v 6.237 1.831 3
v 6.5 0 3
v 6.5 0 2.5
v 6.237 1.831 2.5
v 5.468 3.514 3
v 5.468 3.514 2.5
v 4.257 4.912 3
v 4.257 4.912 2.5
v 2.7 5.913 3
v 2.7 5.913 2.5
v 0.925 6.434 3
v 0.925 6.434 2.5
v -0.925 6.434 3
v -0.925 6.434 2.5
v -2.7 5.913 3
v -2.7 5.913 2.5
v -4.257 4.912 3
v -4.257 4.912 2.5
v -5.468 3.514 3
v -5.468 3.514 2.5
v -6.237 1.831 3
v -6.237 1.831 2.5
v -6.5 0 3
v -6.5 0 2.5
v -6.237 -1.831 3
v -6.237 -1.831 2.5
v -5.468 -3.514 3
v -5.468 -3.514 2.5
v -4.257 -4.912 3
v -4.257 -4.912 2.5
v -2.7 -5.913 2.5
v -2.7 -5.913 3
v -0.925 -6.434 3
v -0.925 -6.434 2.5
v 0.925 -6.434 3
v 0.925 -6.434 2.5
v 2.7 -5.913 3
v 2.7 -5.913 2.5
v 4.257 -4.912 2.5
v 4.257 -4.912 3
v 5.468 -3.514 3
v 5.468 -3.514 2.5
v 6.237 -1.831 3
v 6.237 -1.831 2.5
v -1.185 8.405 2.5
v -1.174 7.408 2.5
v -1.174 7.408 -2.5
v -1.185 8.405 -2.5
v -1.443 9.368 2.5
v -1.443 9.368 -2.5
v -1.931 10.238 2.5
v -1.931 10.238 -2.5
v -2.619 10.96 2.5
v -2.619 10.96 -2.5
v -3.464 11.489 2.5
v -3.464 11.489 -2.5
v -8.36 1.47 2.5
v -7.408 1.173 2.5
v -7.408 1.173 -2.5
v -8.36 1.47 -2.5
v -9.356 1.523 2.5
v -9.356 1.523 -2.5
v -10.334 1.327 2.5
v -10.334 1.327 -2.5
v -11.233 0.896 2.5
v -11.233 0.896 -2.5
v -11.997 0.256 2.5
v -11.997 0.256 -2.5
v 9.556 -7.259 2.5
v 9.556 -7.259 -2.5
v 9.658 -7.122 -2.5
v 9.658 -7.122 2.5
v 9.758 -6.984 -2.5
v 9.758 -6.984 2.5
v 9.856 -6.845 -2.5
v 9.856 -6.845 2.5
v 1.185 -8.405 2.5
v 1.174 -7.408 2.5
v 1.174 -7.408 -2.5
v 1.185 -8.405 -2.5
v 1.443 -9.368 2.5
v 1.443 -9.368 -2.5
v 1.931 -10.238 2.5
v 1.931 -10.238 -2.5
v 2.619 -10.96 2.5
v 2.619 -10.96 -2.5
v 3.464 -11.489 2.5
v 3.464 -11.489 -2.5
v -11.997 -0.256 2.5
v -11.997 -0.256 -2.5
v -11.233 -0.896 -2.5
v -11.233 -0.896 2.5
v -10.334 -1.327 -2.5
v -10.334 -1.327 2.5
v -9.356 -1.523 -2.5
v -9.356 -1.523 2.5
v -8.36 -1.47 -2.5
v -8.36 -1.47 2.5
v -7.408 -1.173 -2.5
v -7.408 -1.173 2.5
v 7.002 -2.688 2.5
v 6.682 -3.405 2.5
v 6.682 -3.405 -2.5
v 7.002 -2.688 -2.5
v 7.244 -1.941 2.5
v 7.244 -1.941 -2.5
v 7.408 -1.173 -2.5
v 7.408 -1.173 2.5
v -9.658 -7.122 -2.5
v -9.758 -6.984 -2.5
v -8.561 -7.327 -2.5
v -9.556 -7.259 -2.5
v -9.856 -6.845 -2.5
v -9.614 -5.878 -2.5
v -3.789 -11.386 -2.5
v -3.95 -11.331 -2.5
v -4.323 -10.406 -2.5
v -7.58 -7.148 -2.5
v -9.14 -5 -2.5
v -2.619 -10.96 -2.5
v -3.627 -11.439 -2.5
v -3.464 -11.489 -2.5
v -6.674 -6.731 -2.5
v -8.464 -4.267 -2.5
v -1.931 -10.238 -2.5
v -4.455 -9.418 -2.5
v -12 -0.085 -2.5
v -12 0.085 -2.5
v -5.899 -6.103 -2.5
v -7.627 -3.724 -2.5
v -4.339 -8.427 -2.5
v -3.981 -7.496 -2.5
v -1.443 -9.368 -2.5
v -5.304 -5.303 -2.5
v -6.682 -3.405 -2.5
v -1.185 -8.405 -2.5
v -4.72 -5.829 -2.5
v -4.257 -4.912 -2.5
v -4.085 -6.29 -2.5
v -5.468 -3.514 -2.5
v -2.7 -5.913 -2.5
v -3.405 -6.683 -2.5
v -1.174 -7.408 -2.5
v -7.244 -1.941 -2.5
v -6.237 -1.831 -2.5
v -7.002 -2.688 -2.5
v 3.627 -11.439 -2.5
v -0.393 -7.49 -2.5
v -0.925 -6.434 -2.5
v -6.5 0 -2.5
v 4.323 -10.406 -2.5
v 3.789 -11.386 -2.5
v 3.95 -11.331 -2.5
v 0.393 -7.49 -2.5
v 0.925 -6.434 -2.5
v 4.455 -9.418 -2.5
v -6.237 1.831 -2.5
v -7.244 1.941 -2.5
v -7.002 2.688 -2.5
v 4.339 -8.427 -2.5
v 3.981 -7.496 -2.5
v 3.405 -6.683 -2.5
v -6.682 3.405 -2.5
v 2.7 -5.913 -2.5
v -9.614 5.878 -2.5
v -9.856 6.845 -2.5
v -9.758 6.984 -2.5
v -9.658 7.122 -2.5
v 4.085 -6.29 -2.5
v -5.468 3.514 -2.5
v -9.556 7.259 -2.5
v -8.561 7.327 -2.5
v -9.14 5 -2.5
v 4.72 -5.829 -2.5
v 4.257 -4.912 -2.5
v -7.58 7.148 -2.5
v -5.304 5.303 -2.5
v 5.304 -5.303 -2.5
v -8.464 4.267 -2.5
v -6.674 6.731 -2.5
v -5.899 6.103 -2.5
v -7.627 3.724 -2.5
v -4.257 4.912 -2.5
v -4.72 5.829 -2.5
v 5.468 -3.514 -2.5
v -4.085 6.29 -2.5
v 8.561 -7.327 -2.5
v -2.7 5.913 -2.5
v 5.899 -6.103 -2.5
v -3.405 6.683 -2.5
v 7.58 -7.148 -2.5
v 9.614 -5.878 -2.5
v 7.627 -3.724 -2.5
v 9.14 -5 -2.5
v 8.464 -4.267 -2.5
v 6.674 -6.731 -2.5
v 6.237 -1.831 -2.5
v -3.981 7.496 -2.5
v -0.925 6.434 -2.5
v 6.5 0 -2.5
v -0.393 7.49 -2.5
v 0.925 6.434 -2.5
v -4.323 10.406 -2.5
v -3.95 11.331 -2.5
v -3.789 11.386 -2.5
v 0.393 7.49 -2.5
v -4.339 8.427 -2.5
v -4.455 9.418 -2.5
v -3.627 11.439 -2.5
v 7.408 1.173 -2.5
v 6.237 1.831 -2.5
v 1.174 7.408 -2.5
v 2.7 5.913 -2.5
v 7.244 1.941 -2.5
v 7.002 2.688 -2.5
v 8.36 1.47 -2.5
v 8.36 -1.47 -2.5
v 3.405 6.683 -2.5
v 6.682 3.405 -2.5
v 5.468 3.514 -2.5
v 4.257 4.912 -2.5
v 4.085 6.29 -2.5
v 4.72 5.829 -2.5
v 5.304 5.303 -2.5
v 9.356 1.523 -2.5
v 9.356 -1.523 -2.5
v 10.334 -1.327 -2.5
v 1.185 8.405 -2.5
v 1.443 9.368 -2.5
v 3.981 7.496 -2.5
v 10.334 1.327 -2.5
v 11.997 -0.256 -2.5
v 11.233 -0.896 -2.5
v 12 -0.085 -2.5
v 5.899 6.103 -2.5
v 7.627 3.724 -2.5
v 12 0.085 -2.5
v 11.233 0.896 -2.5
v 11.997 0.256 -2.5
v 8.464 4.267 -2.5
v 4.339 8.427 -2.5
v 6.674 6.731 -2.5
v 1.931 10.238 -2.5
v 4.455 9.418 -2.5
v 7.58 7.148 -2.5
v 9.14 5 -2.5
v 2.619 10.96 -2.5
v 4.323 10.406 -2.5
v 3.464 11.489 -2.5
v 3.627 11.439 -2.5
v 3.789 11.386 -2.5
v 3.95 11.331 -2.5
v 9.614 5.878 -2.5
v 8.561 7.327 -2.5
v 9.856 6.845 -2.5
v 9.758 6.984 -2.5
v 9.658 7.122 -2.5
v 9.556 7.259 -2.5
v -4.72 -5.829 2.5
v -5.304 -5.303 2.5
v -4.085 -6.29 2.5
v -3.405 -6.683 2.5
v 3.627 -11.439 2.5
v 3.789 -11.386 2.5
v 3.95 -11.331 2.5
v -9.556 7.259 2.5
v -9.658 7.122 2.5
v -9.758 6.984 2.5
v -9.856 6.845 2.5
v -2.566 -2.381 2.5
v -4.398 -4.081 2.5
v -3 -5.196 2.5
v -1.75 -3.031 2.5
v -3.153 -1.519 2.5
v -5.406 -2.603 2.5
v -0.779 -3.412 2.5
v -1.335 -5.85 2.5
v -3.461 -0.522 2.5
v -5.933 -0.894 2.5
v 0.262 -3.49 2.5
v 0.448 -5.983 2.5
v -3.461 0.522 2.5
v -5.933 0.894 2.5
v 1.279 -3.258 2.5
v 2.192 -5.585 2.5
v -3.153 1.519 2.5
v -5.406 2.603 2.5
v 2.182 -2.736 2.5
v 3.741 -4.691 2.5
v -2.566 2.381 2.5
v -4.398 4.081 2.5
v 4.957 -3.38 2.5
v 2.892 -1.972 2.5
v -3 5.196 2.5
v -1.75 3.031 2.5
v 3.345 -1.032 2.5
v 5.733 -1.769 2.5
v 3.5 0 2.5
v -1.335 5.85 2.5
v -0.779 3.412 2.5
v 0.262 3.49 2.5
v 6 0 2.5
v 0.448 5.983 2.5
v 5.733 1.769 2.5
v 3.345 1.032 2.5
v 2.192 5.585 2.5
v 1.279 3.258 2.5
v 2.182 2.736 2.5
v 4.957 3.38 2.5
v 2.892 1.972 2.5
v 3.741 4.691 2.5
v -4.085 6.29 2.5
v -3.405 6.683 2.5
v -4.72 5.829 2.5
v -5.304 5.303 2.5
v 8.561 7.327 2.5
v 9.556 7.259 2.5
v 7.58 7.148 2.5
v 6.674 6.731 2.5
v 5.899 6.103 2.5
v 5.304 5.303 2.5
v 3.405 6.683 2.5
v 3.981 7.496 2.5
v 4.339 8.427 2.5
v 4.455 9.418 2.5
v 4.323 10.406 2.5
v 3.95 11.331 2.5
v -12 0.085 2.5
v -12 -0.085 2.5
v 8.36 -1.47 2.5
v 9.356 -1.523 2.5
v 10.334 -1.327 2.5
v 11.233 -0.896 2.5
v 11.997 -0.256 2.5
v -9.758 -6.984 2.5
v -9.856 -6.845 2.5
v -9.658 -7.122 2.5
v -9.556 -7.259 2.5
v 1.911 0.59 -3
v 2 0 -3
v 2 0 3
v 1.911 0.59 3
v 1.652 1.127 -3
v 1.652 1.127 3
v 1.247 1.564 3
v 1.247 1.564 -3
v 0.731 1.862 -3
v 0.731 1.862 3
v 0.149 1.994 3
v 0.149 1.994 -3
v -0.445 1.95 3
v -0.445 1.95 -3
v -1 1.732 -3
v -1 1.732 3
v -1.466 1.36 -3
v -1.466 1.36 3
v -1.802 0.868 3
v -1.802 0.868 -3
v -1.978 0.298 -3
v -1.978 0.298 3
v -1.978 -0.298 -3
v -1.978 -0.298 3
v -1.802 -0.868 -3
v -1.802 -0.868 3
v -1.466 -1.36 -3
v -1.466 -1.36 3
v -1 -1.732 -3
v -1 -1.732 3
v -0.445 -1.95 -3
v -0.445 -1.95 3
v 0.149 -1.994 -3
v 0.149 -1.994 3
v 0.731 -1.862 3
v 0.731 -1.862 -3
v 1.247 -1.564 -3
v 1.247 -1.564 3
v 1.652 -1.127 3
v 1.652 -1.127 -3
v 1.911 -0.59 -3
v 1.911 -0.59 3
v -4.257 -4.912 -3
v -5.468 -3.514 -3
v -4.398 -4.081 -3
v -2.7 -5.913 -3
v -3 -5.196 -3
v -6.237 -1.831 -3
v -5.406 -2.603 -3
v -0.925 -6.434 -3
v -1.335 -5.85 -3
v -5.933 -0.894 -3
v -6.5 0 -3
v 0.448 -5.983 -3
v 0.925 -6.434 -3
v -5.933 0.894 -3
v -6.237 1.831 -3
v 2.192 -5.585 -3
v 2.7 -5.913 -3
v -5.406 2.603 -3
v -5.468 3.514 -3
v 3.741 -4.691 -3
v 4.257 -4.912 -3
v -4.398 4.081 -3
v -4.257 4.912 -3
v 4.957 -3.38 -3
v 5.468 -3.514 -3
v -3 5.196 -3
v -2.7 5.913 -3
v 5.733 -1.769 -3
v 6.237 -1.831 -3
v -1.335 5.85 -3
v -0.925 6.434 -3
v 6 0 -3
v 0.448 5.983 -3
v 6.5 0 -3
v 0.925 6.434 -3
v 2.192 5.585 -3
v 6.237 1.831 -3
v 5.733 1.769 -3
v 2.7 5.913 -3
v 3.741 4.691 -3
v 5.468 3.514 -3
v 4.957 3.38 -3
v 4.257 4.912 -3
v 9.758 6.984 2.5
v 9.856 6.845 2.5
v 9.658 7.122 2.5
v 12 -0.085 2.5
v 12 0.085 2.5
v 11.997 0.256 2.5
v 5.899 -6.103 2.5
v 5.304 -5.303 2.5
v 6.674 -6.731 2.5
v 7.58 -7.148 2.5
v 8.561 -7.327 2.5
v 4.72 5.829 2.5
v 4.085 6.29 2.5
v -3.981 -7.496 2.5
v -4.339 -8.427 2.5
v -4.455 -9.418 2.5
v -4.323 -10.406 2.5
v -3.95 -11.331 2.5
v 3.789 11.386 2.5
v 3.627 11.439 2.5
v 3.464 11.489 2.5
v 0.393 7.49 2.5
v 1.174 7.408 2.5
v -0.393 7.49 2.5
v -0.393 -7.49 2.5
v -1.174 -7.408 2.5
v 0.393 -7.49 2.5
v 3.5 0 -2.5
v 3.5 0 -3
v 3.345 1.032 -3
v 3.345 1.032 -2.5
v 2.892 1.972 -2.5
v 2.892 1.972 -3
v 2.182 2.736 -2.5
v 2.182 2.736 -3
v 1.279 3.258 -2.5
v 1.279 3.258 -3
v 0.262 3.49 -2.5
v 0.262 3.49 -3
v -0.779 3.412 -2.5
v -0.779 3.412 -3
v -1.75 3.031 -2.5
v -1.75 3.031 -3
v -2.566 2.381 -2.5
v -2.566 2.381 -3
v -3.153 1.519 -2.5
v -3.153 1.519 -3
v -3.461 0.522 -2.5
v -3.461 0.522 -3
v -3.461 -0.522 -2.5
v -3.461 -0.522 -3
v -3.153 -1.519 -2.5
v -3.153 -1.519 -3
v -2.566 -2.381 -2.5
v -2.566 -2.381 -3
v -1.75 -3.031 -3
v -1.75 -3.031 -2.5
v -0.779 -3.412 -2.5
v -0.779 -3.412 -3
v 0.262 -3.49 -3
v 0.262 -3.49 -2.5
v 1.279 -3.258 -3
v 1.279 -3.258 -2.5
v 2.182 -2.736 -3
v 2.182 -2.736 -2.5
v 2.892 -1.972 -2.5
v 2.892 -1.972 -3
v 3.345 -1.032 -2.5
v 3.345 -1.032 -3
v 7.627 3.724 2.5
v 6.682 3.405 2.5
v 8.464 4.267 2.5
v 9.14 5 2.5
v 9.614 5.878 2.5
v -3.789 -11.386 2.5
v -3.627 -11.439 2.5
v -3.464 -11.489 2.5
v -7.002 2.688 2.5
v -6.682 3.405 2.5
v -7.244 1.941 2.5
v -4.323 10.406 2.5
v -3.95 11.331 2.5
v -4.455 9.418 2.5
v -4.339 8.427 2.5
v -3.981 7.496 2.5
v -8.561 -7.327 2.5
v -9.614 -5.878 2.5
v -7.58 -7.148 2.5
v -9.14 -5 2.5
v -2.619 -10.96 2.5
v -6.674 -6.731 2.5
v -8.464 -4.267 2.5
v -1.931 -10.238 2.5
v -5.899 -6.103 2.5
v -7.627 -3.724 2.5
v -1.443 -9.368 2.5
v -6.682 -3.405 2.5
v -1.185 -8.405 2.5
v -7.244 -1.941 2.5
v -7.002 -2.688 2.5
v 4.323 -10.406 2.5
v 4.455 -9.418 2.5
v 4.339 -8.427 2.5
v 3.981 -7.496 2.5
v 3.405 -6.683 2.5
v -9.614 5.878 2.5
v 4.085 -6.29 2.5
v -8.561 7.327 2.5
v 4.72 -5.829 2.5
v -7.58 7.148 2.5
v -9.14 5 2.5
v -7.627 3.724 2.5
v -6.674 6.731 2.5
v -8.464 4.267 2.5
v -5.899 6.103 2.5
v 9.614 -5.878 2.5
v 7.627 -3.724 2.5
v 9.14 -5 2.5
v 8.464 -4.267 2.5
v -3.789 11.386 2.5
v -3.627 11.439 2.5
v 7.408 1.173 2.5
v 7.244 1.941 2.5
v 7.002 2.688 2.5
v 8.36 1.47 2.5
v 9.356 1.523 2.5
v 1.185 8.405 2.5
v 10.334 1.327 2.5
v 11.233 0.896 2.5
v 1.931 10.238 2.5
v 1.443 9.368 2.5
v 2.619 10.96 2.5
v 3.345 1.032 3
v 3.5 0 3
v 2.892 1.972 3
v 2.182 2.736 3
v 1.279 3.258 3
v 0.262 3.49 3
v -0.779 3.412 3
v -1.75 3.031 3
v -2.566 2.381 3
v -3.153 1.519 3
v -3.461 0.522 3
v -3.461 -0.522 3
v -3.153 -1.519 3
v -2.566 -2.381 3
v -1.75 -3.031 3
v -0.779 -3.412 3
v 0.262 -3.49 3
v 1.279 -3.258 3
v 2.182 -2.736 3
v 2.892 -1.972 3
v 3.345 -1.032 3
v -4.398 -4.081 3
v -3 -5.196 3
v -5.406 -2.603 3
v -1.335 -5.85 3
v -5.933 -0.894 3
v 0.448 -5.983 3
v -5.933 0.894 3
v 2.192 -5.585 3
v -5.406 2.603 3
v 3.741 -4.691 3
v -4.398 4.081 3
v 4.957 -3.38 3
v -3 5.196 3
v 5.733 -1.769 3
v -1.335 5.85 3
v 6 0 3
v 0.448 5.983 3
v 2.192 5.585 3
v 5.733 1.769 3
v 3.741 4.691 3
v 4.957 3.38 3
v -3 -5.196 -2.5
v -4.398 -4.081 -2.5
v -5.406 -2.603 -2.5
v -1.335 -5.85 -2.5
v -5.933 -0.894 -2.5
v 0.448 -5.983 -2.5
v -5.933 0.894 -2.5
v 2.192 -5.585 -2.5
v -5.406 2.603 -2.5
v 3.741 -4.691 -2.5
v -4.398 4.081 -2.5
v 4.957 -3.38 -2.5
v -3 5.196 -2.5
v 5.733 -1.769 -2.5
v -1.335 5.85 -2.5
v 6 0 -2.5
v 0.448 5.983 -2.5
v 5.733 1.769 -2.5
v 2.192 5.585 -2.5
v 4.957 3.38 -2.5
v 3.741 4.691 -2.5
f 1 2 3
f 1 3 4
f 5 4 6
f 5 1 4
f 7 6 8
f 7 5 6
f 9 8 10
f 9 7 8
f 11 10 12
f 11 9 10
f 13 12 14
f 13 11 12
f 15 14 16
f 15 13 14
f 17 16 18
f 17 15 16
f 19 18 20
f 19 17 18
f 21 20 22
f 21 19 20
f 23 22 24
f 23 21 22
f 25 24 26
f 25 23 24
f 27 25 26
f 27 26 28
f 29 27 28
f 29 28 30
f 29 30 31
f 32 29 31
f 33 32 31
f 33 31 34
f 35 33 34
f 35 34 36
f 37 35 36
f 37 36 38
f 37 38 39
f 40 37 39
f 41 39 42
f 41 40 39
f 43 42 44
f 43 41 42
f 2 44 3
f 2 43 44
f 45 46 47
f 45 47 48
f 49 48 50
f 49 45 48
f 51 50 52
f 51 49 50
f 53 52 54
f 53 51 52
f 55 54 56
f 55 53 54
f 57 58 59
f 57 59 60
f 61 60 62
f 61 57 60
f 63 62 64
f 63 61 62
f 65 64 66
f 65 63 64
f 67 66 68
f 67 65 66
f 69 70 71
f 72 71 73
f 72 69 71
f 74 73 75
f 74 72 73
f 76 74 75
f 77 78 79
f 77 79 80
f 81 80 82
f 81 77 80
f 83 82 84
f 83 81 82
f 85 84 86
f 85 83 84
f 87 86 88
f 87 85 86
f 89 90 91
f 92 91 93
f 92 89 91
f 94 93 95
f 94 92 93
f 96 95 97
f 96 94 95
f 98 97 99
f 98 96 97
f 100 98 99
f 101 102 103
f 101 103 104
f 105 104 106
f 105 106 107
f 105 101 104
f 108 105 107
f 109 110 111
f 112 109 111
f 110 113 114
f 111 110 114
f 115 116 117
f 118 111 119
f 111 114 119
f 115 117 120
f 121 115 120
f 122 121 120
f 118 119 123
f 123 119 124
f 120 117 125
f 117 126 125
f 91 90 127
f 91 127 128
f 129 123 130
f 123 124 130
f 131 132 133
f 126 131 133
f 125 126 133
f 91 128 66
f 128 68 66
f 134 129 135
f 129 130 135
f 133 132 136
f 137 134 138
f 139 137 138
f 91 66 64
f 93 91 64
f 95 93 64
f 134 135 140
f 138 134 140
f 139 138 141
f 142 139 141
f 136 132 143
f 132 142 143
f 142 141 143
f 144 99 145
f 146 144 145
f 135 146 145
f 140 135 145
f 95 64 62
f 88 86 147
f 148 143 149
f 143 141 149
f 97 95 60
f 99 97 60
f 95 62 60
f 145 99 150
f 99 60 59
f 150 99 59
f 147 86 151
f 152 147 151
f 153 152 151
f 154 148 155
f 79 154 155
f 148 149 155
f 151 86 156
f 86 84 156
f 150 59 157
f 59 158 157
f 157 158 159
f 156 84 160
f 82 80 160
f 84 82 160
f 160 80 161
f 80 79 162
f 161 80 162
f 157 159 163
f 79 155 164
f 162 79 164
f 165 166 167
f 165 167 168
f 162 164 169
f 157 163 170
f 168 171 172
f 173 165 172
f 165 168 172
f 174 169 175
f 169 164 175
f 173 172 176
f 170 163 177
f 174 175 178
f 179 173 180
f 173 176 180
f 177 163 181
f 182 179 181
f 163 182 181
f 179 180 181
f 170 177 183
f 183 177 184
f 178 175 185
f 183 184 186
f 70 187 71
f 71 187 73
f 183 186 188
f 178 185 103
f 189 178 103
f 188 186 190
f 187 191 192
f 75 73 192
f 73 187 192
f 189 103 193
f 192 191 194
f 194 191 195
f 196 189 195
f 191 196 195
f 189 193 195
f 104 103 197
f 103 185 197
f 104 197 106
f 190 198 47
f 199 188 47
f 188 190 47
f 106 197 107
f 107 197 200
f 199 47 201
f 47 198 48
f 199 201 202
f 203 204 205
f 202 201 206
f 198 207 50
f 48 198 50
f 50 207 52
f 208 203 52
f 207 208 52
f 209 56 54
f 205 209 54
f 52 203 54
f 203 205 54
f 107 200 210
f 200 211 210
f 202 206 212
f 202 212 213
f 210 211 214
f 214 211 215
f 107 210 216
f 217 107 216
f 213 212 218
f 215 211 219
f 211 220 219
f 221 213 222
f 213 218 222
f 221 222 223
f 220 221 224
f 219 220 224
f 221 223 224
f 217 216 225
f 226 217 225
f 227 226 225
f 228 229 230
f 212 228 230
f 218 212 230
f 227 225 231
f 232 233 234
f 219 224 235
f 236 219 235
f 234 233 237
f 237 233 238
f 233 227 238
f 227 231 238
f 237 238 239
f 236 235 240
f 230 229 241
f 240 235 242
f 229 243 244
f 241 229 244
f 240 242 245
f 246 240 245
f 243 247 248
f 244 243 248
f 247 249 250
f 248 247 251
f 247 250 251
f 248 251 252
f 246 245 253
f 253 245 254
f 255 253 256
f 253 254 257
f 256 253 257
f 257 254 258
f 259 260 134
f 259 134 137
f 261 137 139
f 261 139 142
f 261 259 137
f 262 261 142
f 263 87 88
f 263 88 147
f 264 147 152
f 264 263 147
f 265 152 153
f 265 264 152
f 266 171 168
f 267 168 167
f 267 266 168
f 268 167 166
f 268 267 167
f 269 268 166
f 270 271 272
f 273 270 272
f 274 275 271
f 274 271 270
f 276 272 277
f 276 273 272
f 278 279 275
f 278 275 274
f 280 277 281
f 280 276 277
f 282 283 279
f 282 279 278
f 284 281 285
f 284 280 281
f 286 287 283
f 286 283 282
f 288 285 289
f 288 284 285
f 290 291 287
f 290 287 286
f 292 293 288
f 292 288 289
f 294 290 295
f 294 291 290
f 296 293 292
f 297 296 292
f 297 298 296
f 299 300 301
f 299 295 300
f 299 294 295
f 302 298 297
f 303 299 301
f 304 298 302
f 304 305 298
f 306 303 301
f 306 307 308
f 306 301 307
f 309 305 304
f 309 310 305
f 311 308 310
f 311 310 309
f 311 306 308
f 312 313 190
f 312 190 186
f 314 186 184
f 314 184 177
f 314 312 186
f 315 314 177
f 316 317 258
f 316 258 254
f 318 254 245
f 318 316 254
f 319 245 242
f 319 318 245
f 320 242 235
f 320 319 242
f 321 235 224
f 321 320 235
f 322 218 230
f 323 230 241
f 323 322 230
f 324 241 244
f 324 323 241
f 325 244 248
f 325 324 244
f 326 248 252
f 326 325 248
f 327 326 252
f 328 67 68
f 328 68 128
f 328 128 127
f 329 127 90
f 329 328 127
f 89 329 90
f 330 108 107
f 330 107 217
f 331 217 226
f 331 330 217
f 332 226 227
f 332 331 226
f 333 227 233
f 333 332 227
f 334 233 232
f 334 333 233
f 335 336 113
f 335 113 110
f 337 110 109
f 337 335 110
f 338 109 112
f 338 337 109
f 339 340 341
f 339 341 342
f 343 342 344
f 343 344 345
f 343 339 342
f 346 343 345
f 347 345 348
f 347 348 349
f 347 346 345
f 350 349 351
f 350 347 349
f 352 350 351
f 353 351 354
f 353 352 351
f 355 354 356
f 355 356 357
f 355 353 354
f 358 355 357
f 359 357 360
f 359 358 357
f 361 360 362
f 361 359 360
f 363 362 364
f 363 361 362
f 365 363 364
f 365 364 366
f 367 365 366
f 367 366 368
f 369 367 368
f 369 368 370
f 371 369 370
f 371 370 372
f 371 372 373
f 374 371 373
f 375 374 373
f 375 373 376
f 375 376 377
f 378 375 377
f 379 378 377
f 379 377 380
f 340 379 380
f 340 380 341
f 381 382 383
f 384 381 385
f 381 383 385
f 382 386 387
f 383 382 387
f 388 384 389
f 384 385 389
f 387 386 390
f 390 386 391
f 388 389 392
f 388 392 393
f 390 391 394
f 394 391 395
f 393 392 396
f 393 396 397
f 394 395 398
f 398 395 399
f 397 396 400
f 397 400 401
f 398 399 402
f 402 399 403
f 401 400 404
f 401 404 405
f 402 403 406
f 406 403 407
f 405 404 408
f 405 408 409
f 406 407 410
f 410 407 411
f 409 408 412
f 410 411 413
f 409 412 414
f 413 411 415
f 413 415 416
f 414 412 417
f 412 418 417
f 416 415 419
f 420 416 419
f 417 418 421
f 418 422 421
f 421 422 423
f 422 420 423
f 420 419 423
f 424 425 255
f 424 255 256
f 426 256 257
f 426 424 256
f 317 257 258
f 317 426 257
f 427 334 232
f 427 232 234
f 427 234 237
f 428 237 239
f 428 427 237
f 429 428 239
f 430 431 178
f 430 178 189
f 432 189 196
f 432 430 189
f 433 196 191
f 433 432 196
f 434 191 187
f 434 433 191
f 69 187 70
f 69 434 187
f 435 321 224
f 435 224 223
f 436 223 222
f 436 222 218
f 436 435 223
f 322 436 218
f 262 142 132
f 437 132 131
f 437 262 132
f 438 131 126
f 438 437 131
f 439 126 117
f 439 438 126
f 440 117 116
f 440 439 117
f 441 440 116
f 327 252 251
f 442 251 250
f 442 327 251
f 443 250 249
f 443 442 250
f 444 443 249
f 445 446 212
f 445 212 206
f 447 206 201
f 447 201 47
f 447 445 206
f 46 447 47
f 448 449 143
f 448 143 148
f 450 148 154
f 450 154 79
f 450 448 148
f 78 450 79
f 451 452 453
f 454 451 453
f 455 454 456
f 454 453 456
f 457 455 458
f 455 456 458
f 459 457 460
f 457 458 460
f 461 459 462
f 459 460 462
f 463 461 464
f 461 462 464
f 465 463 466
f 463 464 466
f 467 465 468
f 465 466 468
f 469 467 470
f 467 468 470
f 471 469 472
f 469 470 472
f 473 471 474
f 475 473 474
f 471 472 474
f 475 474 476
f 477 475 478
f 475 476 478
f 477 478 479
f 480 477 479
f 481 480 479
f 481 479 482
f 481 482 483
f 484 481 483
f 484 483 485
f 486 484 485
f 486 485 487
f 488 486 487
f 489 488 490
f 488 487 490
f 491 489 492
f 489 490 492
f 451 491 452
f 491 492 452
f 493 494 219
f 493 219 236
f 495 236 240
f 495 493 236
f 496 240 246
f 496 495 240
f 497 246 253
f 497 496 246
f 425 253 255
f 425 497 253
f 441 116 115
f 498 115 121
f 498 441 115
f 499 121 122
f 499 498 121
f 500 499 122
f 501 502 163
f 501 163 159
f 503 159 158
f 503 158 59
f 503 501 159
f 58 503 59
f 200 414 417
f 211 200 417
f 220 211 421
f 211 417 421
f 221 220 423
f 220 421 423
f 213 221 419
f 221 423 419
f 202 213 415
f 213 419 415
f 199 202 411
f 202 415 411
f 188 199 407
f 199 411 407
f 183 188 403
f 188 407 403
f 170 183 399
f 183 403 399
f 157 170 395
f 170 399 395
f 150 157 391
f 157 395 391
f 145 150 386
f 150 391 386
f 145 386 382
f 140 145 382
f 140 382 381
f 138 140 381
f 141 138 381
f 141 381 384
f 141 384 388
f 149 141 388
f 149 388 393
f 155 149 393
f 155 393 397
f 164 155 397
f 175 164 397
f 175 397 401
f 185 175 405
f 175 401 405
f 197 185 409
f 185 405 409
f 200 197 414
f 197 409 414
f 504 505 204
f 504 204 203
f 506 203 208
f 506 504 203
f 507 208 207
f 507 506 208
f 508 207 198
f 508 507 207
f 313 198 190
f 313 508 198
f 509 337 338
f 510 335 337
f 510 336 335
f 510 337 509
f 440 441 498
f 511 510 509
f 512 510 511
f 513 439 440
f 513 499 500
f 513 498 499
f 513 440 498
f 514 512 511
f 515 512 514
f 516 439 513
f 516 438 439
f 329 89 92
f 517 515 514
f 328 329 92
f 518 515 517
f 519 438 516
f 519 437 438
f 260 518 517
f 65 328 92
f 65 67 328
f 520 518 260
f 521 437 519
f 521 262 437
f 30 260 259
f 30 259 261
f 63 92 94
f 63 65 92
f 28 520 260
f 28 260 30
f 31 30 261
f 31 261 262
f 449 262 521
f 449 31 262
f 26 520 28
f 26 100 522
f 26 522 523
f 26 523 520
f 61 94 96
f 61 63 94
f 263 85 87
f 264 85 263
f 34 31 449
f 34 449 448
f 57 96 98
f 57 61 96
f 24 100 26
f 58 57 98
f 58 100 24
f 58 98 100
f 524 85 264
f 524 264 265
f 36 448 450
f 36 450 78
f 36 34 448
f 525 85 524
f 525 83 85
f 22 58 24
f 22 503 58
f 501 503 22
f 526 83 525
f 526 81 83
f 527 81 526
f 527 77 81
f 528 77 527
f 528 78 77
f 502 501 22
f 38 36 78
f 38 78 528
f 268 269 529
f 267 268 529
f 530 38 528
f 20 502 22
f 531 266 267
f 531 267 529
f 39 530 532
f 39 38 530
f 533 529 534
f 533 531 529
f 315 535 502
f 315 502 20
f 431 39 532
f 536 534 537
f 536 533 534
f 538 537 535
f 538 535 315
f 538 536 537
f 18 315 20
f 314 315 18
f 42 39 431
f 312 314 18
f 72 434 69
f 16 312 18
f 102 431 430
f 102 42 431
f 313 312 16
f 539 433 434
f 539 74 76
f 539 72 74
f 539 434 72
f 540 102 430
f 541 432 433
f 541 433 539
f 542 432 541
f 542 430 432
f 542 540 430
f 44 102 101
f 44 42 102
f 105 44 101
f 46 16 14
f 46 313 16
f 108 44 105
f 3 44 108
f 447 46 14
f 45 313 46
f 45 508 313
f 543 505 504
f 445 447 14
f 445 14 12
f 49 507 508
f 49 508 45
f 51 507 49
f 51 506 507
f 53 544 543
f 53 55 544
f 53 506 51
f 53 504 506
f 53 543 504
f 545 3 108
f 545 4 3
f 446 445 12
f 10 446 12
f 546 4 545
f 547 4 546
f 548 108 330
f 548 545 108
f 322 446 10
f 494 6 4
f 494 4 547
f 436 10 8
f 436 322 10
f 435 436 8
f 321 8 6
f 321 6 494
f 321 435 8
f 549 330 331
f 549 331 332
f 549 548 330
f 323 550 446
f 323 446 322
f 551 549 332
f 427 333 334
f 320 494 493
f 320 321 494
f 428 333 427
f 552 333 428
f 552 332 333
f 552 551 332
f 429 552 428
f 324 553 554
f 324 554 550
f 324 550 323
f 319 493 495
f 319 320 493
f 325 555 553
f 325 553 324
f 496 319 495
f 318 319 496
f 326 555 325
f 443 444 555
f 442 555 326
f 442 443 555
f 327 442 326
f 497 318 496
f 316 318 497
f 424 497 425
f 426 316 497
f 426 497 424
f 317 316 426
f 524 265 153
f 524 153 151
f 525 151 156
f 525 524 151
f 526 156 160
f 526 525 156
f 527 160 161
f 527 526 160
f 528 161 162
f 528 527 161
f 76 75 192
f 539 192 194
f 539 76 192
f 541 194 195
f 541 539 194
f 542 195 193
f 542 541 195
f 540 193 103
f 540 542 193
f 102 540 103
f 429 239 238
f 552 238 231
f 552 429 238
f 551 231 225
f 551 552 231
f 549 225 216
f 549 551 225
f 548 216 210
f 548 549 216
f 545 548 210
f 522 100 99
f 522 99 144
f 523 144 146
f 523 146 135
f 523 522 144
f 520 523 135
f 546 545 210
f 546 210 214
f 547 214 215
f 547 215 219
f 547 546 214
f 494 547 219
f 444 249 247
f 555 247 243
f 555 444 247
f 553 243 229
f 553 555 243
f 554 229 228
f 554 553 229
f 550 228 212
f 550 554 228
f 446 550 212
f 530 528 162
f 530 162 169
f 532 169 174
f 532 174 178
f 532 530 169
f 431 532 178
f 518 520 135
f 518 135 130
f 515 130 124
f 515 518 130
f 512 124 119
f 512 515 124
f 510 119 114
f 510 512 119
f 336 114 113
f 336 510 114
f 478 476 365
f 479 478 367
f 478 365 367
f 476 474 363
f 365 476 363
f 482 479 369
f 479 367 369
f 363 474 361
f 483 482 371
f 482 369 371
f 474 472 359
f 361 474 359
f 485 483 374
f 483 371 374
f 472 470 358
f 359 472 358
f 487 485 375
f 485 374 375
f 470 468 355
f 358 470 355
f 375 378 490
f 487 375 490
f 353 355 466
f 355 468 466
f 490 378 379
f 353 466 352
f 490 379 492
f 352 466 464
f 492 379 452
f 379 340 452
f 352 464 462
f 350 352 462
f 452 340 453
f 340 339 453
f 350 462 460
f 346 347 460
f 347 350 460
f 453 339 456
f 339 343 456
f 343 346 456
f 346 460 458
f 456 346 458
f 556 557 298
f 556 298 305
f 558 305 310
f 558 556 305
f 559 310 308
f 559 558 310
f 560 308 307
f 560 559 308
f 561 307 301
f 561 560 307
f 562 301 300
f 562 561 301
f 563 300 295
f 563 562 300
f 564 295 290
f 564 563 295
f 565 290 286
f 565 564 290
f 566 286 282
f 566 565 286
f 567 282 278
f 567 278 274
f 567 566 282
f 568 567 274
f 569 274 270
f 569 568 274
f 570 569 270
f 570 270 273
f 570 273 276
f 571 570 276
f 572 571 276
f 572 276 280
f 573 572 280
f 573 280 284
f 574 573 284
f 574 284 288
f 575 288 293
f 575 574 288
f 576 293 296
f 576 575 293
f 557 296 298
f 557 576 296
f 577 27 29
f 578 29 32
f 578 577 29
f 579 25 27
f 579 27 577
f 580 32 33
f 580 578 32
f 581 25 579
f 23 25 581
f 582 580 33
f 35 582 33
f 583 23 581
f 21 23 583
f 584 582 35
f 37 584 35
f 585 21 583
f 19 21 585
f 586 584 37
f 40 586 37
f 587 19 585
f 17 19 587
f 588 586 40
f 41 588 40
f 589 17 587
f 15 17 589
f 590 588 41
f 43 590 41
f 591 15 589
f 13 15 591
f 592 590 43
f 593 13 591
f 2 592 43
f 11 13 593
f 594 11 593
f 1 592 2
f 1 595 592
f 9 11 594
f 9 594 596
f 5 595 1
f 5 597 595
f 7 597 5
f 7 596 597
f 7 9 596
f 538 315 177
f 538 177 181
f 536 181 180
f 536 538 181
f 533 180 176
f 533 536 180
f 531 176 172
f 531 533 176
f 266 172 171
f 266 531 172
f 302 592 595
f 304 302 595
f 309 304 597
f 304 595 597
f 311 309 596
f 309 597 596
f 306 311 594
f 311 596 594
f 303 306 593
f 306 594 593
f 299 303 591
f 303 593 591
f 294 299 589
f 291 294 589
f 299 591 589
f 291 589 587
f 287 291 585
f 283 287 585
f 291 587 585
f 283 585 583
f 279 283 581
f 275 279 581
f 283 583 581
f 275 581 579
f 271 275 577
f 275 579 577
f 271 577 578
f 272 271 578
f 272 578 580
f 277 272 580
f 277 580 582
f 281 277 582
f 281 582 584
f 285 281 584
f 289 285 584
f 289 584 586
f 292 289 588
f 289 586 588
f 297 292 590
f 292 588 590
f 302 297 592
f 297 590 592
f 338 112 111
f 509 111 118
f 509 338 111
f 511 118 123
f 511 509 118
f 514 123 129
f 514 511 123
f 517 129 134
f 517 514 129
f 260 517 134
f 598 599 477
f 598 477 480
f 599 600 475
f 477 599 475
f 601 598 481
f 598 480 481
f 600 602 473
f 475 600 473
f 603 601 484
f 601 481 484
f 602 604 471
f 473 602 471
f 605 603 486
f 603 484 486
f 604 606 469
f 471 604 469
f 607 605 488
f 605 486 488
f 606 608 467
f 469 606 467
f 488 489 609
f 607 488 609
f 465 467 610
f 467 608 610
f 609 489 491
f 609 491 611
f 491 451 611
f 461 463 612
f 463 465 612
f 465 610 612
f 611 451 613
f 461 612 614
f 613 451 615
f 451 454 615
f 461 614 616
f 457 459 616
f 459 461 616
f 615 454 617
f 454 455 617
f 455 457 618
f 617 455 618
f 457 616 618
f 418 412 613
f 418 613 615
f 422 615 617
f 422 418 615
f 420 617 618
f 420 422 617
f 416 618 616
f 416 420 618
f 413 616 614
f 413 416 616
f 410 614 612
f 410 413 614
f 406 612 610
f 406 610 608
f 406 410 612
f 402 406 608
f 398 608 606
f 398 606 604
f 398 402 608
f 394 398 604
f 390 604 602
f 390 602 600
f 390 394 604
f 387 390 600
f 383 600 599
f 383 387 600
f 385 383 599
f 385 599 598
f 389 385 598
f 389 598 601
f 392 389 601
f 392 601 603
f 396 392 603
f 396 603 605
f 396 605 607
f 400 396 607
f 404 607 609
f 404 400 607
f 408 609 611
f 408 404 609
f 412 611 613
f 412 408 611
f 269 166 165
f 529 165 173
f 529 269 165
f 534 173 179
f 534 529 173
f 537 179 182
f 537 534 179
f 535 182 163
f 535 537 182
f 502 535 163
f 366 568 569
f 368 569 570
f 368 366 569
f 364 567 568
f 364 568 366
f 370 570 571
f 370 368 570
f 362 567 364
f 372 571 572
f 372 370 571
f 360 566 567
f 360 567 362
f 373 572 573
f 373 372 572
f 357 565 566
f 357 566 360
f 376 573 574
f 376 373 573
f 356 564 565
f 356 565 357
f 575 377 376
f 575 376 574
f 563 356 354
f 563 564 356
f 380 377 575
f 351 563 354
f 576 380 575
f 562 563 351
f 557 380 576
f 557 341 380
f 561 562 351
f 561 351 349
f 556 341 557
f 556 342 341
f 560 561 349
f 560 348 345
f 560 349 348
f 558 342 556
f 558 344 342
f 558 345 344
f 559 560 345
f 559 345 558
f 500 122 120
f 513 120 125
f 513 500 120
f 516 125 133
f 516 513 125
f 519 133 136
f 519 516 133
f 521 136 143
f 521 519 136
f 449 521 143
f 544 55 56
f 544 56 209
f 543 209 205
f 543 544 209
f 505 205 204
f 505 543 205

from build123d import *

# Parameters (mm, degrees)
SKETCH1_R           = 12
BOSS_EXTRUDE1_DEPTH = 2.5
CUT_EXTRUDE2_DEPTH  = 18.691806013
CIRPATTERN2_COUNT   = 10
SKETCH3_R           = 2
CUT_EXTRUDE3_DEPTH  = 18.349304428
BOSS_EXTRUDE2_START = 0.5
SKETCH4_R           = 6.5
SKETCH4_R_2         = 6
SKETCH4_R_3         = 3.5
SKETCH4_R_4         = 2
BOSS_EXTRUDE2_DEPTH = 0.5


with BuildPart() as part:
    # Sketch1 → Boss-Extrude1 (new, symmetric)
    with BuildSketch(Plane.XY):
        Circle(SKETCH1_R)
    extrude(amount=BOSS_EXTRUDE1_DEPTH, both=True)

    # Sketch2 → Cut-Extrude2 (cut, through all)
    with BuildSketch(Plane.XY.offset(2.5)):
        with BuildLine():
            ThreePointArc((1.173656282, 7.407599539), (0, 7.5), (-1.173656282, 7.407599539))
            ThreePointArc((-1.173656282, 7.407599539), (-1.669021324, 9.83476625), (-3.49865822, 11.504782295))
            ThreePointArc((-3.49865822, 11.504782295), (0, 12.025), (3.49865822, 11.504782295))
            ThreePointArc((3.49865822, 11.504782295), (1.669021324, 9.83476625), (1.173656282, 7.407599539))
        make_face()
    cut_extrude2 = extrude(amount=-CUT_EXTRUDE2_DEPTH, mode=Mode.SUBTRACT)

    # CirPattern2: Cut-Extrude2 ×10 about axis
    cirpattern2_axis = Axis((0, 0, 0), (0, 0, 1))
    for i in range(1, CIRPATTERN2_COUNT):
        add(cut_extrude2.rotate(cirpattern2_axis, i * 360 / CIRPATTERN2_COUNT), mode=Mode.SUBTRACT)

    # Sketch3 → Cut-Extrude3 (cut, through all)
    with BuildSketch(Plane.XY.offset(2.5)):
        Circle(SKETCH3_R)
    extrude(amount=-CUT_EXTRUDE3_DEPTH, mode=Mode.SUBTRACT)

    # Sketch4 → Boss-Extrude2 (add)
    # profile 1 of 2: a face of its own
    with BuildSketch(Plane.XY.offset(2.5).offset(BOSS_EXTRUDE2_START)):
        Circle(SKETCH4_R)
        Circle(SKETCH4_R_2, mode=Mode.SUBTRACT)
    # profile 2 of 2: a face of its own
    with BuildSketch(Plane.XY.offset(2.5).offset(BOSS_EXTRUDE2_START)):
        Circle(SKETCH4_R_3)
        Circle(SKETCH4_R_4, mode=Mode.SUBTRACT)
    boss_extrude2 = extrude(amount=-BOSS_EXTRUDE2_DEPTH)

    # Mirror1: Boss-Extrude2 across plane
    add(boss_extrude2.mirror(Plane.XY))


solid = part.part
